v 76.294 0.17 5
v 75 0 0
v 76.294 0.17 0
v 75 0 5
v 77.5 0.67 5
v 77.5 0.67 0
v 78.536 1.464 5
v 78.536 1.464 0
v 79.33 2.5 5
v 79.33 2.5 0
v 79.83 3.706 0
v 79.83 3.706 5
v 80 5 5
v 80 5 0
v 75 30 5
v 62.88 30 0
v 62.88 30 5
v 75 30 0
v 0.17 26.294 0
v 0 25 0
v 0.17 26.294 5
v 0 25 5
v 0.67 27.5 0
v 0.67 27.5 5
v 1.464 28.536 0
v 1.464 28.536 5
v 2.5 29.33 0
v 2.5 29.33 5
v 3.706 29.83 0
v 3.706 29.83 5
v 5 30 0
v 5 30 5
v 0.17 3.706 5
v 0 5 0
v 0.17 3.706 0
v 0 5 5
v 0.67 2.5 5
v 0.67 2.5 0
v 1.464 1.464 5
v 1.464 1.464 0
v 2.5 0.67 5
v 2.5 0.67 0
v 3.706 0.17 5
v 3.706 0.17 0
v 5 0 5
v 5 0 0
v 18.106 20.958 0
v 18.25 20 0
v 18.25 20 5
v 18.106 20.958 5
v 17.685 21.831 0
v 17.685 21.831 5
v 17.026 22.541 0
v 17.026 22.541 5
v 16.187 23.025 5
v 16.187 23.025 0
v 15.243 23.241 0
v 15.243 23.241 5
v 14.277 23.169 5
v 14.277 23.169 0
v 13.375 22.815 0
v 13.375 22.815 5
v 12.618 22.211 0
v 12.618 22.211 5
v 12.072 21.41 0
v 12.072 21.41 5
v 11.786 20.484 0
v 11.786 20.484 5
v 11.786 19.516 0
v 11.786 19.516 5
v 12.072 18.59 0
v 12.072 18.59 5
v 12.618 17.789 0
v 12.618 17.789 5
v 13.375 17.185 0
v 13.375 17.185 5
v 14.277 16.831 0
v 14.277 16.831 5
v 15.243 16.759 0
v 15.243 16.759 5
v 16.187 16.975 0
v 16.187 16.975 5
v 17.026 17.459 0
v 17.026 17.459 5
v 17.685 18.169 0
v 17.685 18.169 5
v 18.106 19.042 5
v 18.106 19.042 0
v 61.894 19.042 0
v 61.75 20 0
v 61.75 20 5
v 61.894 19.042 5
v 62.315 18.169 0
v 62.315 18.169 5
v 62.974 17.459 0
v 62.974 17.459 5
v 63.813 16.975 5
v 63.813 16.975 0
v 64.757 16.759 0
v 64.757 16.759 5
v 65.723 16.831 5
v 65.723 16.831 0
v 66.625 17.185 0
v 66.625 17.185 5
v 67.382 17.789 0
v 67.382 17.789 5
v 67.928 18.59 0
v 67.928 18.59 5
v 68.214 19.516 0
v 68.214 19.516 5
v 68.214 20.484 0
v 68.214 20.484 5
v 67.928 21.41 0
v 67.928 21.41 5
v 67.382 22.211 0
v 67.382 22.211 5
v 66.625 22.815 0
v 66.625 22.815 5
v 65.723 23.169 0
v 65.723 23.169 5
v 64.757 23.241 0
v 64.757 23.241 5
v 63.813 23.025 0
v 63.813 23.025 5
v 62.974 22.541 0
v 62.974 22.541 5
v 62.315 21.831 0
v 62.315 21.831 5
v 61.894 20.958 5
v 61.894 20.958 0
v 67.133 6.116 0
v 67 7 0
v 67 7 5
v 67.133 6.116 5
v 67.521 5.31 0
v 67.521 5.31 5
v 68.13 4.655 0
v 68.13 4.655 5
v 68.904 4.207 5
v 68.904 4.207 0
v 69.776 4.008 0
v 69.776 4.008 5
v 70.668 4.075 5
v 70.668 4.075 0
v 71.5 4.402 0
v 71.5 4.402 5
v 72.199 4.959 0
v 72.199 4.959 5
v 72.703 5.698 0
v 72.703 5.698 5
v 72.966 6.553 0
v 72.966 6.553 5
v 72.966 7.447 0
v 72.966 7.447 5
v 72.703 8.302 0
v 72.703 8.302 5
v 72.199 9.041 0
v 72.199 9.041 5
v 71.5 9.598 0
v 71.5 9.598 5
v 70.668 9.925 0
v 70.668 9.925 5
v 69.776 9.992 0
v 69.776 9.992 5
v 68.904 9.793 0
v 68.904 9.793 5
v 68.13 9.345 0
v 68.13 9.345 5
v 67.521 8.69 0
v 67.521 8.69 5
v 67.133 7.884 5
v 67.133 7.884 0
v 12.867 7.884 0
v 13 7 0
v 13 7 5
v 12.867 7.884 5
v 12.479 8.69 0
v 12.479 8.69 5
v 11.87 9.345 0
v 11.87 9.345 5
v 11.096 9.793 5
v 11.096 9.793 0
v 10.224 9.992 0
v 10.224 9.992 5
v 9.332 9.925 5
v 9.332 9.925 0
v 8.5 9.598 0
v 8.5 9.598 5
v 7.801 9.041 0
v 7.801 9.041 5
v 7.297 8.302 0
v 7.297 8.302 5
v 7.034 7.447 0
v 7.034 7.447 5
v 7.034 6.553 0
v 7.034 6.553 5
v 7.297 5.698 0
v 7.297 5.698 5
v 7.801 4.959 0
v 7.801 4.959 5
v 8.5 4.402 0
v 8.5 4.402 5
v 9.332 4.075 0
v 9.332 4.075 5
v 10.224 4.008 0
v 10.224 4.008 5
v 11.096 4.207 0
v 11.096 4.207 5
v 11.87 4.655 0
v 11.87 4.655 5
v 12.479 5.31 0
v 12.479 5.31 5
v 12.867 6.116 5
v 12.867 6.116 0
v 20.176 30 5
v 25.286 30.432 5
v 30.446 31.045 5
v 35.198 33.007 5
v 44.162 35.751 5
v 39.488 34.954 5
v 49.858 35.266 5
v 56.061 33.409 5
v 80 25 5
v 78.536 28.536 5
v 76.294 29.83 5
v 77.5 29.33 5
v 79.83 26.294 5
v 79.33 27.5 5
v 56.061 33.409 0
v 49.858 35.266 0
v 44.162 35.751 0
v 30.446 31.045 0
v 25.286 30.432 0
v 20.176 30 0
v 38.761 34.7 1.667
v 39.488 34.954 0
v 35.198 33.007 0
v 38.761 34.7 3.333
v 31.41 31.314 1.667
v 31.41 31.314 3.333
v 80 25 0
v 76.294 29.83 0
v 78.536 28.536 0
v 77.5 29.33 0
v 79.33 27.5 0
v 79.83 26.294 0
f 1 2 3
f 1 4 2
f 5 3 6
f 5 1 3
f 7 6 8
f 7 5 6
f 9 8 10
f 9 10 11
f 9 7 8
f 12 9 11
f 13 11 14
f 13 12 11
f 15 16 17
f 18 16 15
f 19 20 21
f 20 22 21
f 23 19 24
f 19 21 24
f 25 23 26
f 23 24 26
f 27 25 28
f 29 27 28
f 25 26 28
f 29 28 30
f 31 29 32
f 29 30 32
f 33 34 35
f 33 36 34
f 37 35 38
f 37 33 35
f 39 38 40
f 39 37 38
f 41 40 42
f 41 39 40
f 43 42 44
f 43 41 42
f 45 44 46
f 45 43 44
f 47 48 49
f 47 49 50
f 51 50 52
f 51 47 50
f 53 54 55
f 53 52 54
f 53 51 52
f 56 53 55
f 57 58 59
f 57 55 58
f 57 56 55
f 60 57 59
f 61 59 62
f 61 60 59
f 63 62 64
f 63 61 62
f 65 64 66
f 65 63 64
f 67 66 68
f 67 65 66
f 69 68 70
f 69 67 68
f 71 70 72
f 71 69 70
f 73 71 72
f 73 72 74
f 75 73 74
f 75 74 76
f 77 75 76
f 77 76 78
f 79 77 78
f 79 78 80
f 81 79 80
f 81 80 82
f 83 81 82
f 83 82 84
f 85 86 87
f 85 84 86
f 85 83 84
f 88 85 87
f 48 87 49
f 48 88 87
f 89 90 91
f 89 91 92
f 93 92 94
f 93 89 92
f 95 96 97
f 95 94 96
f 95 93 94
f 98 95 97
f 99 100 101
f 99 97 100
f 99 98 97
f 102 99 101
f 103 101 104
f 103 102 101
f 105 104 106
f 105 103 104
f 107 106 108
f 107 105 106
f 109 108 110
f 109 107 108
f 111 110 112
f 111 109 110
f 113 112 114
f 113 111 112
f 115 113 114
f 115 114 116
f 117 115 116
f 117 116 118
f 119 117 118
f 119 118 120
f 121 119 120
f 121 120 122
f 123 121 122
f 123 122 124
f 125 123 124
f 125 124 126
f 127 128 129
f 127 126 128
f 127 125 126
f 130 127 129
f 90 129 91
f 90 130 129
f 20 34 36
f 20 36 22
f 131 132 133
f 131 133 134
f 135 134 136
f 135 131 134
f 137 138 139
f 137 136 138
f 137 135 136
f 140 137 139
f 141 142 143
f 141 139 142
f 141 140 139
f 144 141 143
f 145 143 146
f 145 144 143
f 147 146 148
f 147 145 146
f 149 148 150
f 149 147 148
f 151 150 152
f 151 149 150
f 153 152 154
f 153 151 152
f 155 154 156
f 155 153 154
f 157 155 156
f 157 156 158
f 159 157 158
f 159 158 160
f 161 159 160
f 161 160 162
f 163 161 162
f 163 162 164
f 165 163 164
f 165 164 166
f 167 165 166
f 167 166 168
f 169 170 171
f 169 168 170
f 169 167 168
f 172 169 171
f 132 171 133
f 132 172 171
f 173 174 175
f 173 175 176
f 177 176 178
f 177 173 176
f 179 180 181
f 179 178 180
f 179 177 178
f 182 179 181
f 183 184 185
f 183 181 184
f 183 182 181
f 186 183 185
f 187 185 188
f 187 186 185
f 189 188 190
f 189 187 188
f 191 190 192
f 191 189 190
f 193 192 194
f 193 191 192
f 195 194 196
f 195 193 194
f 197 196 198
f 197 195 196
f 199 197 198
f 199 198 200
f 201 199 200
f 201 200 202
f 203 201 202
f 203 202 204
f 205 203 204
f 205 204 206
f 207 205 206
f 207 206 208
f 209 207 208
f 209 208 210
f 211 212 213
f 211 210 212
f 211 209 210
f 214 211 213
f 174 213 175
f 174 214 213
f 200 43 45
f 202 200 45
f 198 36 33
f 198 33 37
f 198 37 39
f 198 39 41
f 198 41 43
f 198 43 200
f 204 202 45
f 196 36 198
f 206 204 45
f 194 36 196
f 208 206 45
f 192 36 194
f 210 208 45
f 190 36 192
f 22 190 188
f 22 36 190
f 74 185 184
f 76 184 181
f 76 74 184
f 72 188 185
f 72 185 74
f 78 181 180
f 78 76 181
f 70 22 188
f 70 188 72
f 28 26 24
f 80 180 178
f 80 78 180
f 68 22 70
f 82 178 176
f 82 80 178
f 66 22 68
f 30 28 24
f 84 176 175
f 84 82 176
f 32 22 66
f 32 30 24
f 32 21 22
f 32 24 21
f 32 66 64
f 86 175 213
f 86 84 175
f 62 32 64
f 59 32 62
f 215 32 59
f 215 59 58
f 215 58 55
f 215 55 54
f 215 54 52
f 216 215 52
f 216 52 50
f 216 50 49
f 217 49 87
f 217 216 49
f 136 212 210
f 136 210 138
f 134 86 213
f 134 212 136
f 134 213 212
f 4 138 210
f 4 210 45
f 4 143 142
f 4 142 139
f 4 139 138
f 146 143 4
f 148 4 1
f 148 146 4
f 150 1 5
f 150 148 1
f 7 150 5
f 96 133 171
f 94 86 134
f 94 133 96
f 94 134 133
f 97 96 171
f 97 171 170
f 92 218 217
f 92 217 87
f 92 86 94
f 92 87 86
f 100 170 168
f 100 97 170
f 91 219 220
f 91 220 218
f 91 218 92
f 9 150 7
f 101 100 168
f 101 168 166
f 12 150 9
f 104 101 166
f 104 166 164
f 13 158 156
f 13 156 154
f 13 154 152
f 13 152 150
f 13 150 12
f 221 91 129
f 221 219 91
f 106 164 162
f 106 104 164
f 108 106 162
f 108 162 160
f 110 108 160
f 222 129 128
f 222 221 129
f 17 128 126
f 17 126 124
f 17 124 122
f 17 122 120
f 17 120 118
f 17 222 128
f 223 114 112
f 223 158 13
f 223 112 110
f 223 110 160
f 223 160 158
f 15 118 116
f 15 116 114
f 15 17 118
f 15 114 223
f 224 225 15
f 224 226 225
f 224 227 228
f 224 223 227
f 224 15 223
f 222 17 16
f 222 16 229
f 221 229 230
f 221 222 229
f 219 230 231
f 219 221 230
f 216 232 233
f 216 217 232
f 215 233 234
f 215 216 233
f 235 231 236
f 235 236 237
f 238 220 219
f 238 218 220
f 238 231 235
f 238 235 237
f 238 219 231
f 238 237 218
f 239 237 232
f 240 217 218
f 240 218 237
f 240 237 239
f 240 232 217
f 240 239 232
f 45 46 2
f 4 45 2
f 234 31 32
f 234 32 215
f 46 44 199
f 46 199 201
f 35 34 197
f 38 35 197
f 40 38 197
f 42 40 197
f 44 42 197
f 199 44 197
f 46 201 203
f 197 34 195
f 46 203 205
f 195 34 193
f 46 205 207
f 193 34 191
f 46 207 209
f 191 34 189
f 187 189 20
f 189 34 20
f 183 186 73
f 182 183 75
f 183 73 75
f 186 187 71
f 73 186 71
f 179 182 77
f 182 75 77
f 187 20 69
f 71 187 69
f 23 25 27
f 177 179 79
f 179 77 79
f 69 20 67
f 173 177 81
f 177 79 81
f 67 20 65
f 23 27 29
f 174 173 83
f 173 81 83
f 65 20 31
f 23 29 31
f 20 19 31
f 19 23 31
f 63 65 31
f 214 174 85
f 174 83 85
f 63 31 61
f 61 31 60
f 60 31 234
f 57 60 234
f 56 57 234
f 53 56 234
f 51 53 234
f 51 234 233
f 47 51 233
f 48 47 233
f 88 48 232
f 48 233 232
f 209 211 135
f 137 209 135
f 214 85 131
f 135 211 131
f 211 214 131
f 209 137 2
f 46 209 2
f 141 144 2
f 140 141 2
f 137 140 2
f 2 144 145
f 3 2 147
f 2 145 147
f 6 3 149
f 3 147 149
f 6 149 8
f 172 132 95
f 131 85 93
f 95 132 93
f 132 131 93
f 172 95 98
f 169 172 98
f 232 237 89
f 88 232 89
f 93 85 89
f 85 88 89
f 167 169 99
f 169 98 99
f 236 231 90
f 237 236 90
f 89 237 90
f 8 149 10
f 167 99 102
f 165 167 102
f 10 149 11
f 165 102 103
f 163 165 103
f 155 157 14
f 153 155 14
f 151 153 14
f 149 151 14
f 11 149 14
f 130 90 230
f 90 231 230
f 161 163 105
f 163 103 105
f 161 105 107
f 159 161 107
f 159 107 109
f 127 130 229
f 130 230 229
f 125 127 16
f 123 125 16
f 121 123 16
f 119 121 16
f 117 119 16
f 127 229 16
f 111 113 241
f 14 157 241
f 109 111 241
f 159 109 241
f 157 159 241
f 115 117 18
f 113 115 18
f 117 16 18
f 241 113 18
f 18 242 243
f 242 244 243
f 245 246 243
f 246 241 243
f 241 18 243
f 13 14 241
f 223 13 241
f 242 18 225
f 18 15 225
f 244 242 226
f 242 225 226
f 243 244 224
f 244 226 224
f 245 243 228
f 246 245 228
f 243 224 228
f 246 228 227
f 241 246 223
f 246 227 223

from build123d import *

# Parameters (mm, degrees)
ESQUISSE1_W                  = 80
ESQUISSE1_H                  = 30
BOSS_EXTRU_1_DEPTH           = 5
ENL_V_MAT_EXTRU_1_DEPTH      = 86.586213843
ENL_V_MAT_EXTRU_1_DEPTH_BACK = 86.586213843
ESQUISSE2_R                  = 3.25
ESQUISSE2_R_2                = 3
CONG_1_R                     = 5
BOSS_EXTRU_2_DEPTH           = 5


with BuildPart() as part:
    # Esquisse1 → Boss.-Extru.1 (new body)
    with BuildSketch(Plane.XY):
        with Locations((40, 15)):
            Rectangle(ESQUISSE1_W, ESQUISSE1_H)
    extrude(amount=BOSS_EXTRU_1_DEPTH)

    # Esquisse2 → Enlèv. mat.-Extru.1 (cut, two sides: drawn at the far end of the back side and taken through both)
    with BuildSketch(Plane.XY.offset(5).offset(-ENL_V_MAT_EXTRU_1_DEPTH_BACK)):
        with Locations((15, 20)):
            Circle(ESQUISSE2_R)
        with Locations(Location((65, 20, 0), (0, 0, 180))):
            Circle(ESQUISSE2_R)
        with Locations((10, 7)):
            Circle(ESQUISSE2_R_2)
        with Locations(Location((70, 7, 0), (0, 0, 180))):
            Circle(ESQUISSE2_R_2)
    extrude(amount=ENL_V_MAT_EXTRU_1_DEPTH + ENL_V_MAT_EXTRU_1_DEPTH_BACK, mode=Mode.SUBTRACT)

    # Congé1
    cong_1_edges = [part.edges().sort_by_distance(p)[0] for p in [
        (0, 30, 2.5),
        (80, 30, 2.5),
        (80, 0, 2.5),
        (0, 0, 2.5),
    ]]
    fillet(cong_1_edges, radius=CONG_1_R)

    # Esquisse3 → Boss.-Extru.2 (add)
    with BuildSketch(Plane.XY.offset(5)):
        with BuildLine():
            Line((20.175853906, 30), (62.880368617, 30))
            add(Edge.make_bspline(
                [(62.880368617, 30), (56.248577834, 34.044178021), (43.342547907, 38.777474561), (30.753908623, 29.855151718), (23.756853958, 30.615618698), (20.175853906, 30)],
                knots=[0, 0, 0, 0, 0.562893367, 0.745092862, 1, 1, 1, 1], degree=3))
        make_face()
    extrude(amount=-BOSS_EXTRU_2_DEPTH)


solid = part.part
